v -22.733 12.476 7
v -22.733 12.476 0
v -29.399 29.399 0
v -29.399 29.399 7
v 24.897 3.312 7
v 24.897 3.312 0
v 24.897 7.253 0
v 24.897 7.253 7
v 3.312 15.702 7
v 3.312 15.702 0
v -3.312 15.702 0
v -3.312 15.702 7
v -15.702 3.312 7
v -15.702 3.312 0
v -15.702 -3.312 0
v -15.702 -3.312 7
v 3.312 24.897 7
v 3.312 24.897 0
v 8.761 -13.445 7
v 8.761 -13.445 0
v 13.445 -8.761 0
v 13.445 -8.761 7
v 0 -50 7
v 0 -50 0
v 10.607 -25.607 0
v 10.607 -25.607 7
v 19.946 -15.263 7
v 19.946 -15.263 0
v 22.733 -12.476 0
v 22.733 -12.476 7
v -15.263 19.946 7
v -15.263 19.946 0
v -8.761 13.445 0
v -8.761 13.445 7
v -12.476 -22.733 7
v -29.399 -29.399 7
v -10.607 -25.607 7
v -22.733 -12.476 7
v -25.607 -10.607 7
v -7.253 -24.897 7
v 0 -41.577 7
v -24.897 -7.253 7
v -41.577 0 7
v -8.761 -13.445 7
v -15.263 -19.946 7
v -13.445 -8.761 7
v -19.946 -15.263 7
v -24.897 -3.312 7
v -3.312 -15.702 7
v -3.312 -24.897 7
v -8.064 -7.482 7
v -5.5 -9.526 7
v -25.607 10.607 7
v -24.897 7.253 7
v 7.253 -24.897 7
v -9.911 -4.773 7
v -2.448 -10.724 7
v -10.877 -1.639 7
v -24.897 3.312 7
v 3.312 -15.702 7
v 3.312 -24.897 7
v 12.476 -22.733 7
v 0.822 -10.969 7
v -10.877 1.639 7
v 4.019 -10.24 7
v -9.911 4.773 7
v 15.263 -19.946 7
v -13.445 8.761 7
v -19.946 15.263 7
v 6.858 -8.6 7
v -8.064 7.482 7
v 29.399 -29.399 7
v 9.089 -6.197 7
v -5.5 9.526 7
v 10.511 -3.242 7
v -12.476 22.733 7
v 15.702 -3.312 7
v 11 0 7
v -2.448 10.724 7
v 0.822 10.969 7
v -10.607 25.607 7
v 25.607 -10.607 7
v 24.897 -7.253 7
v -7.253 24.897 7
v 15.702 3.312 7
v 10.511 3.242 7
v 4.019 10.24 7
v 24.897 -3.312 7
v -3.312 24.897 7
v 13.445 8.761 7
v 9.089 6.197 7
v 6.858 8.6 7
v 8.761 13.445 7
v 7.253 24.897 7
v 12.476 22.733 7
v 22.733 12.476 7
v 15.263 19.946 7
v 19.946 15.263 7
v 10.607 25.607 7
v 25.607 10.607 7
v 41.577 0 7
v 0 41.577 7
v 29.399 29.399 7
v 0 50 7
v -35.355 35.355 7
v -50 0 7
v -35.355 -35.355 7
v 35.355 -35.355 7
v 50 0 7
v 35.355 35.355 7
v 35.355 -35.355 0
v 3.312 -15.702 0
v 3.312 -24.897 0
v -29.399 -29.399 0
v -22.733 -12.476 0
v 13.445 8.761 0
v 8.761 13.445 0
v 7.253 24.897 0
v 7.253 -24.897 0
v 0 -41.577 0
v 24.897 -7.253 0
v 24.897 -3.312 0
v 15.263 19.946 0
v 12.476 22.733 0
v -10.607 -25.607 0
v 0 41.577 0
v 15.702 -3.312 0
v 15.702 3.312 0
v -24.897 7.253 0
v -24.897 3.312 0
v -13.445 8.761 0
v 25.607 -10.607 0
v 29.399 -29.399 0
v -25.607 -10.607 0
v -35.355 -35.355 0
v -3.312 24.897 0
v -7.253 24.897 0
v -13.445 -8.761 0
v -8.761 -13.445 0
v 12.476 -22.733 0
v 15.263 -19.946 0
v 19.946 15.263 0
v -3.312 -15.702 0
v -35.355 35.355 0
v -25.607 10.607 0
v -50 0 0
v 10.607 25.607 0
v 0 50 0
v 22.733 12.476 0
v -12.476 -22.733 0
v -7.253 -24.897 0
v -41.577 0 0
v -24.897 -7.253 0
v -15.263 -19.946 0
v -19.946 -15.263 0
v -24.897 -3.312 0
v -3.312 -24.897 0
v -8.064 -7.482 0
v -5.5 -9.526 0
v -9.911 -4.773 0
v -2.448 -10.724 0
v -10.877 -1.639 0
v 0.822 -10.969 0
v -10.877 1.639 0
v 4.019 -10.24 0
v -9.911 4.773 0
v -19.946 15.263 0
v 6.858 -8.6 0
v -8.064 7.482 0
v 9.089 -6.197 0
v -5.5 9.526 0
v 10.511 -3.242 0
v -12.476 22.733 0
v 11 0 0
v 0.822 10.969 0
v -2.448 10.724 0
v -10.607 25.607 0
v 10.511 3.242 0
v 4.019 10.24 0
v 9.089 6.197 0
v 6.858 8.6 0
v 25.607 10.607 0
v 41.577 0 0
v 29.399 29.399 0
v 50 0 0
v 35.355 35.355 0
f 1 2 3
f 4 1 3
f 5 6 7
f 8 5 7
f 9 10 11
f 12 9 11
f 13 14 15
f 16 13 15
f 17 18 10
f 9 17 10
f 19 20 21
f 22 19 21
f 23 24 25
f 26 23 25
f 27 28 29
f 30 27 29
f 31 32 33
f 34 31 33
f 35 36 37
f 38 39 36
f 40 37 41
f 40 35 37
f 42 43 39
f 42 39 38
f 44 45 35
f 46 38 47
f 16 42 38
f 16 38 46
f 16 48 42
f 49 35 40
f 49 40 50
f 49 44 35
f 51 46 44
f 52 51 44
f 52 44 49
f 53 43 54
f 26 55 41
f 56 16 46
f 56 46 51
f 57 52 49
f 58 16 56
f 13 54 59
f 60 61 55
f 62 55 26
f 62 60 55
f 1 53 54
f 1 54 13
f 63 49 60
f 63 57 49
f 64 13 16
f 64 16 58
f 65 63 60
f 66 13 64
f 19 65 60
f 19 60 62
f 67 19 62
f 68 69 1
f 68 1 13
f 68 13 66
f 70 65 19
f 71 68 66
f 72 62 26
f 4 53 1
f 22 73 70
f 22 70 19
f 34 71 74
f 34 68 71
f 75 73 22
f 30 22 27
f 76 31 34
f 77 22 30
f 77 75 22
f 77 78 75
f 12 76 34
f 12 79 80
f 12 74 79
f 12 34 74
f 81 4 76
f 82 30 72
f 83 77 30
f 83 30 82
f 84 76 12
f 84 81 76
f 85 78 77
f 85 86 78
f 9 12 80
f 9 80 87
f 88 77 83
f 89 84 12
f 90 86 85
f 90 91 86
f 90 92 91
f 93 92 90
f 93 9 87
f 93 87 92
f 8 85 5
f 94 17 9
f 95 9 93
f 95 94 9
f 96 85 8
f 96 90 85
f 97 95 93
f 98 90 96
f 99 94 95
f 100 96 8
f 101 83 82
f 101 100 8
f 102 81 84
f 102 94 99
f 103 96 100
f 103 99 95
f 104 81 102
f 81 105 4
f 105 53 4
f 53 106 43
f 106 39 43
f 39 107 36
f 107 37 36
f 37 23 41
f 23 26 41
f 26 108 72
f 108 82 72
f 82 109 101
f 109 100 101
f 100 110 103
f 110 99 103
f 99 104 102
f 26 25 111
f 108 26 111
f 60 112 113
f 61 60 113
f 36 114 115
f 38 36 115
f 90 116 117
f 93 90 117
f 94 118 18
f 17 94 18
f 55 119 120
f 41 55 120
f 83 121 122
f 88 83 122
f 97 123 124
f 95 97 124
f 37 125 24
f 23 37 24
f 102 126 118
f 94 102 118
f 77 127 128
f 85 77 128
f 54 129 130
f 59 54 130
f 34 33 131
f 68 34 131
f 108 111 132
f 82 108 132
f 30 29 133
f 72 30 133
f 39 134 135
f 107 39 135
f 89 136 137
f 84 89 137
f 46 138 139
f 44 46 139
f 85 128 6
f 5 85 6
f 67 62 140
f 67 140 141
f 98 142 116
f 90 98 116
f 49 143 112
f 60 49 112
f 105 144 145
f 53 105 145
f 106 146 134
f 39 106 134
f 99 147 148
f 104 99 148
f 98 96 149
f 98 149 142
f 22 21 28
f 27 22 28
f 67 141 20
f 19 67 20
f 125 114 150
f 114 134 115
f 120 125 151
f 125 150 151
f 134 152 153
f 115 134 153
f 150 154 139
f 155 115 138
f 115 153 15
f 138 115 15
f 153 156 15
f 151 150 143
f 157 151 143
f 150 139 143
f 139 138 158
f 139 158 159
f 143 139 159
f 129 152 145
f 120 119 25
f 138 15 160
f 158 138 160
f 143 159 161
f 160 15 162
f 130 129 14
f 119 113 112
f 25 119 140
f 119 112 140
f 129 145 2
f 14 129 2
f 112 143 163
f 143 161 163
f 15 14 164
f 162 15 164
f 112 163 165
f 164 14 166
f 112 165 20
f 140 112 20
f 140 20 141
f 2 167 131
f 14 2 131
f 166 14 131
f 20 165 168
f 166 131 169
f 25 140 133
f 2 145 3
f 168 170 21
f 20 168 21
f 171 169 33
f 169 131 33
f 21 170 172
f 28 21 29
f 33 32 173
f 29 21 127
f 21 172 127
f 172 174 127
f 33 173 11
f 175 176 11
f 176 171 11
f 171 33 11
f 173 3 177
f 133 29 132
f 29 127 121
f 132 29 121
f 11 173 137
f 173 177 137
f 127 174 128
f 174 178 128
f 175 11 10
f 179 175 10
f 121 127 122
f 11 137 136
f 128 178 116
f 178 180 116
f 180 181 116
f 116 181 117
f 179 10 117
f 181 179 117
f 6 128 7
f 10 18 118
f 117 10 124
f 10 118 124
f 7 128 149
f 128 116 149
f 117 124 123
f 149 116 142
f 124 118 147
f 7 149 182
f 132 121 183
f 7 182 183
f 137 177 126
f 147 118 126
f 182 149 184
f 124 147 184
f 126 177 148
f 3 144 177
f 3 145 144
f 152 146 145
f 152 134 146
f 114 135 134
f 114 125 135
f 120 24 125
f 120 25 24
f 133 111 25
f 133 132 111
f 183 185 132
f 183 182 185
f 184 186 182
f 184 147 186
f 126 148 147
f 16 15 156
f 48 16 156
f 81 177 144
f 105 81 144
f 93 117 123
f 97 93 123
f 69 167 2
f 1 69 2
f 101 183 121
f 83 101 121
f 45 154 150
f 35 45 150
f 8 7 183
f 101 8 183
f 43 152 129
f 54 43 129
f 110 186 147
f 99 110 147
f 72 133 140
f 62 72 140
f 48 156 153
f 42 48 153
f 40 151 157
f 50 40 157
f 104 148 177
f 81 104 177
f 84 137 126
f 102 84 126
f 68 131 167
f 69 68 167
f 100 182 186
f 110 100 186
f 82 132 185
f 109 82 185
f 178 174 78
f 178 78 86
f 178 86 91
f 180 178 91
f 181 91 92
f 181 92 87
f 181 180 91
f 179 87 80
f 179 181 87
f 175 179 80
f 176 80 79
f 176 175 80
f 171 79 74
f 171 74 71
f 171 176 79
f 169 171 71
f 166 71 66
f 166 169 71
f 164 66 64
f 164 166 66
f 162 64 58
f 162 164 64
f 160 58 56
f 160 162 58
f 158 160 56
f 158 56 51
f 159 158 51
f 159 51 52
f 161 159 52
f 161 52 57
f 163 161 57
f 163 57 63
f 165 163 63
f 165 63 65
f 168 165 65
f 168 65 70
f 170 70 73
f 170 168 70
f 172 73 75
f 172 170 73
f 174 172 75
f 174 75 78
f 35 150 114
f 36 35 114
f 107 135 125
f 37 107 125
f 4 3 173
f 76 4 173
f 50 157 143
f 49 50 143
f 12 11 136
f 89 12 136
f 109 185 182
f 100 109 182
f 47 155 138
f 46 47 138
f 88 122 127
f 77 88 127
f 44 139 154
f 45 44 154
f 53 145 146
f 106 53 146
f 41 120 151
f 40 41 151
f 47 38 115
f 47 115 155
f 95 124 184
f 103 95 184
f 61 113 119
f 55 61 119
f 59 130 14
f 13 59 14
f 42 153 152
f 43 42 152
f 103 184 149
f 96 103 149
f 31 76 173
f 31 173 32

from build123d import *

# Parameters (mm, degrees)
F0_R     = 11
F1_DEPTH = 7


with BuildPart() as f1:
    # F0 (on Top) → F1 (new body)
    with BuildSketch(Plane.XY):
        Polygon((0, 50), (-10.606602, 25.606602), (-35.355339, 35.355339), (-25.606602, 10.606602), (-50, 0), (-25.606602, -10.606602), (-35.355339, -35.355339), (-10.606602, -25.606602), (0, -50), (10.606602, -25.606602), (35.355339, -35.355339), (25.606602, -10.606602), (50, 0), (25.606602, 10.606602), (35.355339, 35.355339), (10.606602, 25.606602), align=None)
        Polygon((7.252651, -24.896849), (0, -41.576724), (-7.252651, -24.896849), (-3.311682, -24.896849), (-3.311682, -15.702289), (0, -15.702289), (3.311682, -15.702289), (3.311682, -24.896849), align=None, mode=Mode.SUBTRACT)
        Polygon((-12.476332, -22.733129), (-29.399184, -29.399184), (-22.733129, -12.476332), (-19.946444, -15.263018), (-13.444908, -8.761482), (-11.103195, -11.103195), (-8.761482, -13.444908), (-15.263018, -19.946444), align=None, mode=Mode.SUBTRACT)
        Polygon((22.733129, -12.476332), (29.399184, -29.399184), (12.476332, -22.733129), (15.263018, -19.946444), (8.761482, -13.444908), (11.103195, -11.103195), (13.444908, -8.761482), (19.946444, -15.263018), align=None, mode=Mode.SUBTRACT)
        Polygon((-24.896849, -7.252651), (-41.576724, 0), (-24.896849, 7.252651), (-24.896849, 3.311682), (-15.702289, 3.311682), (-15.702289, 0), (-15.702289, -3.311682), (-24.896849, -3.311682), align=None, mode=Mode.SUBTRACT)
        Polygon((-22.733129, 12.476332), (-29.399184, 29.399184), (-12.476332, 22.733129), (-15.263018, 19.946444), (-8.761482, 13.444908), (-11.103195, 11.103195), (-13.444908, 8.761482), (-19.946444, 15.263018), align=None, mode=Mode.SUBTRACT)
        Circle(F0_R, mode=Mode.SUBTRACT)
        Polygon((12.476332, 22.733129), (29.399184, 29.399184), (22.733129, 12.476332), (19.946444, 15.263018), (13.444908, 8.761482), (11.103195, 11.103195), (8.761482, 13.444908), (15.263018, 19.946444), align=None, mode=Mode.SUBTRACT)
        Polygon((24.896849, 7.252651), (41.576724, 0), (24.896849, -7.252651), (24.896849, -3.311682), (15.702289, -3.311682), (15.702289, 0), (15.702289, 3.311682), (24.896849, 3.311682), align=None, mode=Mode.SUBTRACT)
        Polygon((-7.252651, 24.896849), (0, 41.576724), (7.252651, 24.896849), (3.311682, 24.896849), (3.311682, 15.702289), (0, 15.702289), (-3.311682, 15.702289), (-3.311682, 24.896849), align=None, mode=Mode.SUBTRACT)
    extrude(amount=F1_DEPTH)


solid = f1.part
